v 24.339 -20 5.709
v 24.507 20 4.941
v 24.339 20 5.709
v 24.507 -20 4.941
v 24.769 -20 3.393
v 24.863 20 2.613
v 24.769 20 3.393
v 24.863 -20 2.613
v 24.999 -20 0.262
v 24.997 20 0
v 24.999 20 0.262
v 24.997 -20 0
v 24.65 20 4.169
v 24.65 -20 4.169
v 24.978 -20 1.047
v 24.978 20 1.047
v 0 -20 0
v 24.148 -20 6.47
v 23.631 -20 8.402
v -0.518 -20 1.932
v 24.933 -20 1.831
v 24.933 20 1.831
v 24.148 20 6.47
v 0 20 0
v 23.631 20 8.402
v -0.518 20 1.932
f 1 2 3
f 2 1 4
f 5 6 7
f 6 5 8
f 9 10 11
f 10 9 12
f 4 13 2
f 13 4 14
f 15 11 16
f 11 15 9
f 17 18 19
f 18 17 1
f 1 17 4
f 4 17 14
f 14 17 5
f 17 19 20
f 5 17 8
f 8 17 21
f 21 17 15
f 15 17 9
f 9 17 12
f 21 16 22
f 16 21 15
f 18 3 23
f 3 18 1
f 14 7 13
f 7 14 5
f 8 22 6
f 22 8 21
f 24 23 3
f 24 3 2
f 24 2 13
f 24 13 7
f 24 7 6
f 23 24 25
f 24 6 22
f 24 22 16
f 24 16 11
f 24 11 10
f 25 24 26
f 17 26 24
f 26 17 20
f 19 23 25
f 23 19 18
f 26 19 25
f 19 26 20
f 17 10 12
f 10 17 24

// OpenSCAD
// Creacion de cuña paramétrica para apoyo de camara en cuad

//Variables:
ancho=25;
largo=40;
grueso=2; // En el vertice de la cuña.
angulo=15; // En grados, menor de 90º

// Creacion del la cuña en los siguientes pasos: 
// 1. Creacion de un cilindro para la base del la cuña
// 2. Al cilindro anterior le hacemos una interseccion booleana para quedarnos con el cuarto inferior.
// 3. Se le crea un cubo superior para generar el grueso de la cuña
// 4. Se gira todo el cuerpor de la cuña el angulo
// 5. Se elimina la parte por debajo del plano XY

// 5.Sustraccion del cuerpo cubo de sobrante al cuerpo base
difference(){
// 4.Rotacion del cuerpo base
rotate([0,-angulo,0])
// 3. Cuerpo de la cuña incluido el gruueso
    union(){
    // 2.Cuerpo de la cuña
    intersection(){
    // 1. Cilindro base
    rotate([90,0,0])
    cylinder(r=ancho,h=largo,$fn=200, center=true);
    // 2.Cubo para Base
    translate([0,-((largo/2)+1),-ancho-2])
    cube([ancho+2,largo+2,ancho+2]);
    }
    //3.cubo de grosor superior
    translate([0,-largo/2,0])
    cube([ancho,largo,grueso]);
}
// 5.cubo para eliminiacion del sobrante
translate([-1,-((largo/2)+1),-ancho-2])
cube([ancho+2,largo+2,ancho+2]);
}
